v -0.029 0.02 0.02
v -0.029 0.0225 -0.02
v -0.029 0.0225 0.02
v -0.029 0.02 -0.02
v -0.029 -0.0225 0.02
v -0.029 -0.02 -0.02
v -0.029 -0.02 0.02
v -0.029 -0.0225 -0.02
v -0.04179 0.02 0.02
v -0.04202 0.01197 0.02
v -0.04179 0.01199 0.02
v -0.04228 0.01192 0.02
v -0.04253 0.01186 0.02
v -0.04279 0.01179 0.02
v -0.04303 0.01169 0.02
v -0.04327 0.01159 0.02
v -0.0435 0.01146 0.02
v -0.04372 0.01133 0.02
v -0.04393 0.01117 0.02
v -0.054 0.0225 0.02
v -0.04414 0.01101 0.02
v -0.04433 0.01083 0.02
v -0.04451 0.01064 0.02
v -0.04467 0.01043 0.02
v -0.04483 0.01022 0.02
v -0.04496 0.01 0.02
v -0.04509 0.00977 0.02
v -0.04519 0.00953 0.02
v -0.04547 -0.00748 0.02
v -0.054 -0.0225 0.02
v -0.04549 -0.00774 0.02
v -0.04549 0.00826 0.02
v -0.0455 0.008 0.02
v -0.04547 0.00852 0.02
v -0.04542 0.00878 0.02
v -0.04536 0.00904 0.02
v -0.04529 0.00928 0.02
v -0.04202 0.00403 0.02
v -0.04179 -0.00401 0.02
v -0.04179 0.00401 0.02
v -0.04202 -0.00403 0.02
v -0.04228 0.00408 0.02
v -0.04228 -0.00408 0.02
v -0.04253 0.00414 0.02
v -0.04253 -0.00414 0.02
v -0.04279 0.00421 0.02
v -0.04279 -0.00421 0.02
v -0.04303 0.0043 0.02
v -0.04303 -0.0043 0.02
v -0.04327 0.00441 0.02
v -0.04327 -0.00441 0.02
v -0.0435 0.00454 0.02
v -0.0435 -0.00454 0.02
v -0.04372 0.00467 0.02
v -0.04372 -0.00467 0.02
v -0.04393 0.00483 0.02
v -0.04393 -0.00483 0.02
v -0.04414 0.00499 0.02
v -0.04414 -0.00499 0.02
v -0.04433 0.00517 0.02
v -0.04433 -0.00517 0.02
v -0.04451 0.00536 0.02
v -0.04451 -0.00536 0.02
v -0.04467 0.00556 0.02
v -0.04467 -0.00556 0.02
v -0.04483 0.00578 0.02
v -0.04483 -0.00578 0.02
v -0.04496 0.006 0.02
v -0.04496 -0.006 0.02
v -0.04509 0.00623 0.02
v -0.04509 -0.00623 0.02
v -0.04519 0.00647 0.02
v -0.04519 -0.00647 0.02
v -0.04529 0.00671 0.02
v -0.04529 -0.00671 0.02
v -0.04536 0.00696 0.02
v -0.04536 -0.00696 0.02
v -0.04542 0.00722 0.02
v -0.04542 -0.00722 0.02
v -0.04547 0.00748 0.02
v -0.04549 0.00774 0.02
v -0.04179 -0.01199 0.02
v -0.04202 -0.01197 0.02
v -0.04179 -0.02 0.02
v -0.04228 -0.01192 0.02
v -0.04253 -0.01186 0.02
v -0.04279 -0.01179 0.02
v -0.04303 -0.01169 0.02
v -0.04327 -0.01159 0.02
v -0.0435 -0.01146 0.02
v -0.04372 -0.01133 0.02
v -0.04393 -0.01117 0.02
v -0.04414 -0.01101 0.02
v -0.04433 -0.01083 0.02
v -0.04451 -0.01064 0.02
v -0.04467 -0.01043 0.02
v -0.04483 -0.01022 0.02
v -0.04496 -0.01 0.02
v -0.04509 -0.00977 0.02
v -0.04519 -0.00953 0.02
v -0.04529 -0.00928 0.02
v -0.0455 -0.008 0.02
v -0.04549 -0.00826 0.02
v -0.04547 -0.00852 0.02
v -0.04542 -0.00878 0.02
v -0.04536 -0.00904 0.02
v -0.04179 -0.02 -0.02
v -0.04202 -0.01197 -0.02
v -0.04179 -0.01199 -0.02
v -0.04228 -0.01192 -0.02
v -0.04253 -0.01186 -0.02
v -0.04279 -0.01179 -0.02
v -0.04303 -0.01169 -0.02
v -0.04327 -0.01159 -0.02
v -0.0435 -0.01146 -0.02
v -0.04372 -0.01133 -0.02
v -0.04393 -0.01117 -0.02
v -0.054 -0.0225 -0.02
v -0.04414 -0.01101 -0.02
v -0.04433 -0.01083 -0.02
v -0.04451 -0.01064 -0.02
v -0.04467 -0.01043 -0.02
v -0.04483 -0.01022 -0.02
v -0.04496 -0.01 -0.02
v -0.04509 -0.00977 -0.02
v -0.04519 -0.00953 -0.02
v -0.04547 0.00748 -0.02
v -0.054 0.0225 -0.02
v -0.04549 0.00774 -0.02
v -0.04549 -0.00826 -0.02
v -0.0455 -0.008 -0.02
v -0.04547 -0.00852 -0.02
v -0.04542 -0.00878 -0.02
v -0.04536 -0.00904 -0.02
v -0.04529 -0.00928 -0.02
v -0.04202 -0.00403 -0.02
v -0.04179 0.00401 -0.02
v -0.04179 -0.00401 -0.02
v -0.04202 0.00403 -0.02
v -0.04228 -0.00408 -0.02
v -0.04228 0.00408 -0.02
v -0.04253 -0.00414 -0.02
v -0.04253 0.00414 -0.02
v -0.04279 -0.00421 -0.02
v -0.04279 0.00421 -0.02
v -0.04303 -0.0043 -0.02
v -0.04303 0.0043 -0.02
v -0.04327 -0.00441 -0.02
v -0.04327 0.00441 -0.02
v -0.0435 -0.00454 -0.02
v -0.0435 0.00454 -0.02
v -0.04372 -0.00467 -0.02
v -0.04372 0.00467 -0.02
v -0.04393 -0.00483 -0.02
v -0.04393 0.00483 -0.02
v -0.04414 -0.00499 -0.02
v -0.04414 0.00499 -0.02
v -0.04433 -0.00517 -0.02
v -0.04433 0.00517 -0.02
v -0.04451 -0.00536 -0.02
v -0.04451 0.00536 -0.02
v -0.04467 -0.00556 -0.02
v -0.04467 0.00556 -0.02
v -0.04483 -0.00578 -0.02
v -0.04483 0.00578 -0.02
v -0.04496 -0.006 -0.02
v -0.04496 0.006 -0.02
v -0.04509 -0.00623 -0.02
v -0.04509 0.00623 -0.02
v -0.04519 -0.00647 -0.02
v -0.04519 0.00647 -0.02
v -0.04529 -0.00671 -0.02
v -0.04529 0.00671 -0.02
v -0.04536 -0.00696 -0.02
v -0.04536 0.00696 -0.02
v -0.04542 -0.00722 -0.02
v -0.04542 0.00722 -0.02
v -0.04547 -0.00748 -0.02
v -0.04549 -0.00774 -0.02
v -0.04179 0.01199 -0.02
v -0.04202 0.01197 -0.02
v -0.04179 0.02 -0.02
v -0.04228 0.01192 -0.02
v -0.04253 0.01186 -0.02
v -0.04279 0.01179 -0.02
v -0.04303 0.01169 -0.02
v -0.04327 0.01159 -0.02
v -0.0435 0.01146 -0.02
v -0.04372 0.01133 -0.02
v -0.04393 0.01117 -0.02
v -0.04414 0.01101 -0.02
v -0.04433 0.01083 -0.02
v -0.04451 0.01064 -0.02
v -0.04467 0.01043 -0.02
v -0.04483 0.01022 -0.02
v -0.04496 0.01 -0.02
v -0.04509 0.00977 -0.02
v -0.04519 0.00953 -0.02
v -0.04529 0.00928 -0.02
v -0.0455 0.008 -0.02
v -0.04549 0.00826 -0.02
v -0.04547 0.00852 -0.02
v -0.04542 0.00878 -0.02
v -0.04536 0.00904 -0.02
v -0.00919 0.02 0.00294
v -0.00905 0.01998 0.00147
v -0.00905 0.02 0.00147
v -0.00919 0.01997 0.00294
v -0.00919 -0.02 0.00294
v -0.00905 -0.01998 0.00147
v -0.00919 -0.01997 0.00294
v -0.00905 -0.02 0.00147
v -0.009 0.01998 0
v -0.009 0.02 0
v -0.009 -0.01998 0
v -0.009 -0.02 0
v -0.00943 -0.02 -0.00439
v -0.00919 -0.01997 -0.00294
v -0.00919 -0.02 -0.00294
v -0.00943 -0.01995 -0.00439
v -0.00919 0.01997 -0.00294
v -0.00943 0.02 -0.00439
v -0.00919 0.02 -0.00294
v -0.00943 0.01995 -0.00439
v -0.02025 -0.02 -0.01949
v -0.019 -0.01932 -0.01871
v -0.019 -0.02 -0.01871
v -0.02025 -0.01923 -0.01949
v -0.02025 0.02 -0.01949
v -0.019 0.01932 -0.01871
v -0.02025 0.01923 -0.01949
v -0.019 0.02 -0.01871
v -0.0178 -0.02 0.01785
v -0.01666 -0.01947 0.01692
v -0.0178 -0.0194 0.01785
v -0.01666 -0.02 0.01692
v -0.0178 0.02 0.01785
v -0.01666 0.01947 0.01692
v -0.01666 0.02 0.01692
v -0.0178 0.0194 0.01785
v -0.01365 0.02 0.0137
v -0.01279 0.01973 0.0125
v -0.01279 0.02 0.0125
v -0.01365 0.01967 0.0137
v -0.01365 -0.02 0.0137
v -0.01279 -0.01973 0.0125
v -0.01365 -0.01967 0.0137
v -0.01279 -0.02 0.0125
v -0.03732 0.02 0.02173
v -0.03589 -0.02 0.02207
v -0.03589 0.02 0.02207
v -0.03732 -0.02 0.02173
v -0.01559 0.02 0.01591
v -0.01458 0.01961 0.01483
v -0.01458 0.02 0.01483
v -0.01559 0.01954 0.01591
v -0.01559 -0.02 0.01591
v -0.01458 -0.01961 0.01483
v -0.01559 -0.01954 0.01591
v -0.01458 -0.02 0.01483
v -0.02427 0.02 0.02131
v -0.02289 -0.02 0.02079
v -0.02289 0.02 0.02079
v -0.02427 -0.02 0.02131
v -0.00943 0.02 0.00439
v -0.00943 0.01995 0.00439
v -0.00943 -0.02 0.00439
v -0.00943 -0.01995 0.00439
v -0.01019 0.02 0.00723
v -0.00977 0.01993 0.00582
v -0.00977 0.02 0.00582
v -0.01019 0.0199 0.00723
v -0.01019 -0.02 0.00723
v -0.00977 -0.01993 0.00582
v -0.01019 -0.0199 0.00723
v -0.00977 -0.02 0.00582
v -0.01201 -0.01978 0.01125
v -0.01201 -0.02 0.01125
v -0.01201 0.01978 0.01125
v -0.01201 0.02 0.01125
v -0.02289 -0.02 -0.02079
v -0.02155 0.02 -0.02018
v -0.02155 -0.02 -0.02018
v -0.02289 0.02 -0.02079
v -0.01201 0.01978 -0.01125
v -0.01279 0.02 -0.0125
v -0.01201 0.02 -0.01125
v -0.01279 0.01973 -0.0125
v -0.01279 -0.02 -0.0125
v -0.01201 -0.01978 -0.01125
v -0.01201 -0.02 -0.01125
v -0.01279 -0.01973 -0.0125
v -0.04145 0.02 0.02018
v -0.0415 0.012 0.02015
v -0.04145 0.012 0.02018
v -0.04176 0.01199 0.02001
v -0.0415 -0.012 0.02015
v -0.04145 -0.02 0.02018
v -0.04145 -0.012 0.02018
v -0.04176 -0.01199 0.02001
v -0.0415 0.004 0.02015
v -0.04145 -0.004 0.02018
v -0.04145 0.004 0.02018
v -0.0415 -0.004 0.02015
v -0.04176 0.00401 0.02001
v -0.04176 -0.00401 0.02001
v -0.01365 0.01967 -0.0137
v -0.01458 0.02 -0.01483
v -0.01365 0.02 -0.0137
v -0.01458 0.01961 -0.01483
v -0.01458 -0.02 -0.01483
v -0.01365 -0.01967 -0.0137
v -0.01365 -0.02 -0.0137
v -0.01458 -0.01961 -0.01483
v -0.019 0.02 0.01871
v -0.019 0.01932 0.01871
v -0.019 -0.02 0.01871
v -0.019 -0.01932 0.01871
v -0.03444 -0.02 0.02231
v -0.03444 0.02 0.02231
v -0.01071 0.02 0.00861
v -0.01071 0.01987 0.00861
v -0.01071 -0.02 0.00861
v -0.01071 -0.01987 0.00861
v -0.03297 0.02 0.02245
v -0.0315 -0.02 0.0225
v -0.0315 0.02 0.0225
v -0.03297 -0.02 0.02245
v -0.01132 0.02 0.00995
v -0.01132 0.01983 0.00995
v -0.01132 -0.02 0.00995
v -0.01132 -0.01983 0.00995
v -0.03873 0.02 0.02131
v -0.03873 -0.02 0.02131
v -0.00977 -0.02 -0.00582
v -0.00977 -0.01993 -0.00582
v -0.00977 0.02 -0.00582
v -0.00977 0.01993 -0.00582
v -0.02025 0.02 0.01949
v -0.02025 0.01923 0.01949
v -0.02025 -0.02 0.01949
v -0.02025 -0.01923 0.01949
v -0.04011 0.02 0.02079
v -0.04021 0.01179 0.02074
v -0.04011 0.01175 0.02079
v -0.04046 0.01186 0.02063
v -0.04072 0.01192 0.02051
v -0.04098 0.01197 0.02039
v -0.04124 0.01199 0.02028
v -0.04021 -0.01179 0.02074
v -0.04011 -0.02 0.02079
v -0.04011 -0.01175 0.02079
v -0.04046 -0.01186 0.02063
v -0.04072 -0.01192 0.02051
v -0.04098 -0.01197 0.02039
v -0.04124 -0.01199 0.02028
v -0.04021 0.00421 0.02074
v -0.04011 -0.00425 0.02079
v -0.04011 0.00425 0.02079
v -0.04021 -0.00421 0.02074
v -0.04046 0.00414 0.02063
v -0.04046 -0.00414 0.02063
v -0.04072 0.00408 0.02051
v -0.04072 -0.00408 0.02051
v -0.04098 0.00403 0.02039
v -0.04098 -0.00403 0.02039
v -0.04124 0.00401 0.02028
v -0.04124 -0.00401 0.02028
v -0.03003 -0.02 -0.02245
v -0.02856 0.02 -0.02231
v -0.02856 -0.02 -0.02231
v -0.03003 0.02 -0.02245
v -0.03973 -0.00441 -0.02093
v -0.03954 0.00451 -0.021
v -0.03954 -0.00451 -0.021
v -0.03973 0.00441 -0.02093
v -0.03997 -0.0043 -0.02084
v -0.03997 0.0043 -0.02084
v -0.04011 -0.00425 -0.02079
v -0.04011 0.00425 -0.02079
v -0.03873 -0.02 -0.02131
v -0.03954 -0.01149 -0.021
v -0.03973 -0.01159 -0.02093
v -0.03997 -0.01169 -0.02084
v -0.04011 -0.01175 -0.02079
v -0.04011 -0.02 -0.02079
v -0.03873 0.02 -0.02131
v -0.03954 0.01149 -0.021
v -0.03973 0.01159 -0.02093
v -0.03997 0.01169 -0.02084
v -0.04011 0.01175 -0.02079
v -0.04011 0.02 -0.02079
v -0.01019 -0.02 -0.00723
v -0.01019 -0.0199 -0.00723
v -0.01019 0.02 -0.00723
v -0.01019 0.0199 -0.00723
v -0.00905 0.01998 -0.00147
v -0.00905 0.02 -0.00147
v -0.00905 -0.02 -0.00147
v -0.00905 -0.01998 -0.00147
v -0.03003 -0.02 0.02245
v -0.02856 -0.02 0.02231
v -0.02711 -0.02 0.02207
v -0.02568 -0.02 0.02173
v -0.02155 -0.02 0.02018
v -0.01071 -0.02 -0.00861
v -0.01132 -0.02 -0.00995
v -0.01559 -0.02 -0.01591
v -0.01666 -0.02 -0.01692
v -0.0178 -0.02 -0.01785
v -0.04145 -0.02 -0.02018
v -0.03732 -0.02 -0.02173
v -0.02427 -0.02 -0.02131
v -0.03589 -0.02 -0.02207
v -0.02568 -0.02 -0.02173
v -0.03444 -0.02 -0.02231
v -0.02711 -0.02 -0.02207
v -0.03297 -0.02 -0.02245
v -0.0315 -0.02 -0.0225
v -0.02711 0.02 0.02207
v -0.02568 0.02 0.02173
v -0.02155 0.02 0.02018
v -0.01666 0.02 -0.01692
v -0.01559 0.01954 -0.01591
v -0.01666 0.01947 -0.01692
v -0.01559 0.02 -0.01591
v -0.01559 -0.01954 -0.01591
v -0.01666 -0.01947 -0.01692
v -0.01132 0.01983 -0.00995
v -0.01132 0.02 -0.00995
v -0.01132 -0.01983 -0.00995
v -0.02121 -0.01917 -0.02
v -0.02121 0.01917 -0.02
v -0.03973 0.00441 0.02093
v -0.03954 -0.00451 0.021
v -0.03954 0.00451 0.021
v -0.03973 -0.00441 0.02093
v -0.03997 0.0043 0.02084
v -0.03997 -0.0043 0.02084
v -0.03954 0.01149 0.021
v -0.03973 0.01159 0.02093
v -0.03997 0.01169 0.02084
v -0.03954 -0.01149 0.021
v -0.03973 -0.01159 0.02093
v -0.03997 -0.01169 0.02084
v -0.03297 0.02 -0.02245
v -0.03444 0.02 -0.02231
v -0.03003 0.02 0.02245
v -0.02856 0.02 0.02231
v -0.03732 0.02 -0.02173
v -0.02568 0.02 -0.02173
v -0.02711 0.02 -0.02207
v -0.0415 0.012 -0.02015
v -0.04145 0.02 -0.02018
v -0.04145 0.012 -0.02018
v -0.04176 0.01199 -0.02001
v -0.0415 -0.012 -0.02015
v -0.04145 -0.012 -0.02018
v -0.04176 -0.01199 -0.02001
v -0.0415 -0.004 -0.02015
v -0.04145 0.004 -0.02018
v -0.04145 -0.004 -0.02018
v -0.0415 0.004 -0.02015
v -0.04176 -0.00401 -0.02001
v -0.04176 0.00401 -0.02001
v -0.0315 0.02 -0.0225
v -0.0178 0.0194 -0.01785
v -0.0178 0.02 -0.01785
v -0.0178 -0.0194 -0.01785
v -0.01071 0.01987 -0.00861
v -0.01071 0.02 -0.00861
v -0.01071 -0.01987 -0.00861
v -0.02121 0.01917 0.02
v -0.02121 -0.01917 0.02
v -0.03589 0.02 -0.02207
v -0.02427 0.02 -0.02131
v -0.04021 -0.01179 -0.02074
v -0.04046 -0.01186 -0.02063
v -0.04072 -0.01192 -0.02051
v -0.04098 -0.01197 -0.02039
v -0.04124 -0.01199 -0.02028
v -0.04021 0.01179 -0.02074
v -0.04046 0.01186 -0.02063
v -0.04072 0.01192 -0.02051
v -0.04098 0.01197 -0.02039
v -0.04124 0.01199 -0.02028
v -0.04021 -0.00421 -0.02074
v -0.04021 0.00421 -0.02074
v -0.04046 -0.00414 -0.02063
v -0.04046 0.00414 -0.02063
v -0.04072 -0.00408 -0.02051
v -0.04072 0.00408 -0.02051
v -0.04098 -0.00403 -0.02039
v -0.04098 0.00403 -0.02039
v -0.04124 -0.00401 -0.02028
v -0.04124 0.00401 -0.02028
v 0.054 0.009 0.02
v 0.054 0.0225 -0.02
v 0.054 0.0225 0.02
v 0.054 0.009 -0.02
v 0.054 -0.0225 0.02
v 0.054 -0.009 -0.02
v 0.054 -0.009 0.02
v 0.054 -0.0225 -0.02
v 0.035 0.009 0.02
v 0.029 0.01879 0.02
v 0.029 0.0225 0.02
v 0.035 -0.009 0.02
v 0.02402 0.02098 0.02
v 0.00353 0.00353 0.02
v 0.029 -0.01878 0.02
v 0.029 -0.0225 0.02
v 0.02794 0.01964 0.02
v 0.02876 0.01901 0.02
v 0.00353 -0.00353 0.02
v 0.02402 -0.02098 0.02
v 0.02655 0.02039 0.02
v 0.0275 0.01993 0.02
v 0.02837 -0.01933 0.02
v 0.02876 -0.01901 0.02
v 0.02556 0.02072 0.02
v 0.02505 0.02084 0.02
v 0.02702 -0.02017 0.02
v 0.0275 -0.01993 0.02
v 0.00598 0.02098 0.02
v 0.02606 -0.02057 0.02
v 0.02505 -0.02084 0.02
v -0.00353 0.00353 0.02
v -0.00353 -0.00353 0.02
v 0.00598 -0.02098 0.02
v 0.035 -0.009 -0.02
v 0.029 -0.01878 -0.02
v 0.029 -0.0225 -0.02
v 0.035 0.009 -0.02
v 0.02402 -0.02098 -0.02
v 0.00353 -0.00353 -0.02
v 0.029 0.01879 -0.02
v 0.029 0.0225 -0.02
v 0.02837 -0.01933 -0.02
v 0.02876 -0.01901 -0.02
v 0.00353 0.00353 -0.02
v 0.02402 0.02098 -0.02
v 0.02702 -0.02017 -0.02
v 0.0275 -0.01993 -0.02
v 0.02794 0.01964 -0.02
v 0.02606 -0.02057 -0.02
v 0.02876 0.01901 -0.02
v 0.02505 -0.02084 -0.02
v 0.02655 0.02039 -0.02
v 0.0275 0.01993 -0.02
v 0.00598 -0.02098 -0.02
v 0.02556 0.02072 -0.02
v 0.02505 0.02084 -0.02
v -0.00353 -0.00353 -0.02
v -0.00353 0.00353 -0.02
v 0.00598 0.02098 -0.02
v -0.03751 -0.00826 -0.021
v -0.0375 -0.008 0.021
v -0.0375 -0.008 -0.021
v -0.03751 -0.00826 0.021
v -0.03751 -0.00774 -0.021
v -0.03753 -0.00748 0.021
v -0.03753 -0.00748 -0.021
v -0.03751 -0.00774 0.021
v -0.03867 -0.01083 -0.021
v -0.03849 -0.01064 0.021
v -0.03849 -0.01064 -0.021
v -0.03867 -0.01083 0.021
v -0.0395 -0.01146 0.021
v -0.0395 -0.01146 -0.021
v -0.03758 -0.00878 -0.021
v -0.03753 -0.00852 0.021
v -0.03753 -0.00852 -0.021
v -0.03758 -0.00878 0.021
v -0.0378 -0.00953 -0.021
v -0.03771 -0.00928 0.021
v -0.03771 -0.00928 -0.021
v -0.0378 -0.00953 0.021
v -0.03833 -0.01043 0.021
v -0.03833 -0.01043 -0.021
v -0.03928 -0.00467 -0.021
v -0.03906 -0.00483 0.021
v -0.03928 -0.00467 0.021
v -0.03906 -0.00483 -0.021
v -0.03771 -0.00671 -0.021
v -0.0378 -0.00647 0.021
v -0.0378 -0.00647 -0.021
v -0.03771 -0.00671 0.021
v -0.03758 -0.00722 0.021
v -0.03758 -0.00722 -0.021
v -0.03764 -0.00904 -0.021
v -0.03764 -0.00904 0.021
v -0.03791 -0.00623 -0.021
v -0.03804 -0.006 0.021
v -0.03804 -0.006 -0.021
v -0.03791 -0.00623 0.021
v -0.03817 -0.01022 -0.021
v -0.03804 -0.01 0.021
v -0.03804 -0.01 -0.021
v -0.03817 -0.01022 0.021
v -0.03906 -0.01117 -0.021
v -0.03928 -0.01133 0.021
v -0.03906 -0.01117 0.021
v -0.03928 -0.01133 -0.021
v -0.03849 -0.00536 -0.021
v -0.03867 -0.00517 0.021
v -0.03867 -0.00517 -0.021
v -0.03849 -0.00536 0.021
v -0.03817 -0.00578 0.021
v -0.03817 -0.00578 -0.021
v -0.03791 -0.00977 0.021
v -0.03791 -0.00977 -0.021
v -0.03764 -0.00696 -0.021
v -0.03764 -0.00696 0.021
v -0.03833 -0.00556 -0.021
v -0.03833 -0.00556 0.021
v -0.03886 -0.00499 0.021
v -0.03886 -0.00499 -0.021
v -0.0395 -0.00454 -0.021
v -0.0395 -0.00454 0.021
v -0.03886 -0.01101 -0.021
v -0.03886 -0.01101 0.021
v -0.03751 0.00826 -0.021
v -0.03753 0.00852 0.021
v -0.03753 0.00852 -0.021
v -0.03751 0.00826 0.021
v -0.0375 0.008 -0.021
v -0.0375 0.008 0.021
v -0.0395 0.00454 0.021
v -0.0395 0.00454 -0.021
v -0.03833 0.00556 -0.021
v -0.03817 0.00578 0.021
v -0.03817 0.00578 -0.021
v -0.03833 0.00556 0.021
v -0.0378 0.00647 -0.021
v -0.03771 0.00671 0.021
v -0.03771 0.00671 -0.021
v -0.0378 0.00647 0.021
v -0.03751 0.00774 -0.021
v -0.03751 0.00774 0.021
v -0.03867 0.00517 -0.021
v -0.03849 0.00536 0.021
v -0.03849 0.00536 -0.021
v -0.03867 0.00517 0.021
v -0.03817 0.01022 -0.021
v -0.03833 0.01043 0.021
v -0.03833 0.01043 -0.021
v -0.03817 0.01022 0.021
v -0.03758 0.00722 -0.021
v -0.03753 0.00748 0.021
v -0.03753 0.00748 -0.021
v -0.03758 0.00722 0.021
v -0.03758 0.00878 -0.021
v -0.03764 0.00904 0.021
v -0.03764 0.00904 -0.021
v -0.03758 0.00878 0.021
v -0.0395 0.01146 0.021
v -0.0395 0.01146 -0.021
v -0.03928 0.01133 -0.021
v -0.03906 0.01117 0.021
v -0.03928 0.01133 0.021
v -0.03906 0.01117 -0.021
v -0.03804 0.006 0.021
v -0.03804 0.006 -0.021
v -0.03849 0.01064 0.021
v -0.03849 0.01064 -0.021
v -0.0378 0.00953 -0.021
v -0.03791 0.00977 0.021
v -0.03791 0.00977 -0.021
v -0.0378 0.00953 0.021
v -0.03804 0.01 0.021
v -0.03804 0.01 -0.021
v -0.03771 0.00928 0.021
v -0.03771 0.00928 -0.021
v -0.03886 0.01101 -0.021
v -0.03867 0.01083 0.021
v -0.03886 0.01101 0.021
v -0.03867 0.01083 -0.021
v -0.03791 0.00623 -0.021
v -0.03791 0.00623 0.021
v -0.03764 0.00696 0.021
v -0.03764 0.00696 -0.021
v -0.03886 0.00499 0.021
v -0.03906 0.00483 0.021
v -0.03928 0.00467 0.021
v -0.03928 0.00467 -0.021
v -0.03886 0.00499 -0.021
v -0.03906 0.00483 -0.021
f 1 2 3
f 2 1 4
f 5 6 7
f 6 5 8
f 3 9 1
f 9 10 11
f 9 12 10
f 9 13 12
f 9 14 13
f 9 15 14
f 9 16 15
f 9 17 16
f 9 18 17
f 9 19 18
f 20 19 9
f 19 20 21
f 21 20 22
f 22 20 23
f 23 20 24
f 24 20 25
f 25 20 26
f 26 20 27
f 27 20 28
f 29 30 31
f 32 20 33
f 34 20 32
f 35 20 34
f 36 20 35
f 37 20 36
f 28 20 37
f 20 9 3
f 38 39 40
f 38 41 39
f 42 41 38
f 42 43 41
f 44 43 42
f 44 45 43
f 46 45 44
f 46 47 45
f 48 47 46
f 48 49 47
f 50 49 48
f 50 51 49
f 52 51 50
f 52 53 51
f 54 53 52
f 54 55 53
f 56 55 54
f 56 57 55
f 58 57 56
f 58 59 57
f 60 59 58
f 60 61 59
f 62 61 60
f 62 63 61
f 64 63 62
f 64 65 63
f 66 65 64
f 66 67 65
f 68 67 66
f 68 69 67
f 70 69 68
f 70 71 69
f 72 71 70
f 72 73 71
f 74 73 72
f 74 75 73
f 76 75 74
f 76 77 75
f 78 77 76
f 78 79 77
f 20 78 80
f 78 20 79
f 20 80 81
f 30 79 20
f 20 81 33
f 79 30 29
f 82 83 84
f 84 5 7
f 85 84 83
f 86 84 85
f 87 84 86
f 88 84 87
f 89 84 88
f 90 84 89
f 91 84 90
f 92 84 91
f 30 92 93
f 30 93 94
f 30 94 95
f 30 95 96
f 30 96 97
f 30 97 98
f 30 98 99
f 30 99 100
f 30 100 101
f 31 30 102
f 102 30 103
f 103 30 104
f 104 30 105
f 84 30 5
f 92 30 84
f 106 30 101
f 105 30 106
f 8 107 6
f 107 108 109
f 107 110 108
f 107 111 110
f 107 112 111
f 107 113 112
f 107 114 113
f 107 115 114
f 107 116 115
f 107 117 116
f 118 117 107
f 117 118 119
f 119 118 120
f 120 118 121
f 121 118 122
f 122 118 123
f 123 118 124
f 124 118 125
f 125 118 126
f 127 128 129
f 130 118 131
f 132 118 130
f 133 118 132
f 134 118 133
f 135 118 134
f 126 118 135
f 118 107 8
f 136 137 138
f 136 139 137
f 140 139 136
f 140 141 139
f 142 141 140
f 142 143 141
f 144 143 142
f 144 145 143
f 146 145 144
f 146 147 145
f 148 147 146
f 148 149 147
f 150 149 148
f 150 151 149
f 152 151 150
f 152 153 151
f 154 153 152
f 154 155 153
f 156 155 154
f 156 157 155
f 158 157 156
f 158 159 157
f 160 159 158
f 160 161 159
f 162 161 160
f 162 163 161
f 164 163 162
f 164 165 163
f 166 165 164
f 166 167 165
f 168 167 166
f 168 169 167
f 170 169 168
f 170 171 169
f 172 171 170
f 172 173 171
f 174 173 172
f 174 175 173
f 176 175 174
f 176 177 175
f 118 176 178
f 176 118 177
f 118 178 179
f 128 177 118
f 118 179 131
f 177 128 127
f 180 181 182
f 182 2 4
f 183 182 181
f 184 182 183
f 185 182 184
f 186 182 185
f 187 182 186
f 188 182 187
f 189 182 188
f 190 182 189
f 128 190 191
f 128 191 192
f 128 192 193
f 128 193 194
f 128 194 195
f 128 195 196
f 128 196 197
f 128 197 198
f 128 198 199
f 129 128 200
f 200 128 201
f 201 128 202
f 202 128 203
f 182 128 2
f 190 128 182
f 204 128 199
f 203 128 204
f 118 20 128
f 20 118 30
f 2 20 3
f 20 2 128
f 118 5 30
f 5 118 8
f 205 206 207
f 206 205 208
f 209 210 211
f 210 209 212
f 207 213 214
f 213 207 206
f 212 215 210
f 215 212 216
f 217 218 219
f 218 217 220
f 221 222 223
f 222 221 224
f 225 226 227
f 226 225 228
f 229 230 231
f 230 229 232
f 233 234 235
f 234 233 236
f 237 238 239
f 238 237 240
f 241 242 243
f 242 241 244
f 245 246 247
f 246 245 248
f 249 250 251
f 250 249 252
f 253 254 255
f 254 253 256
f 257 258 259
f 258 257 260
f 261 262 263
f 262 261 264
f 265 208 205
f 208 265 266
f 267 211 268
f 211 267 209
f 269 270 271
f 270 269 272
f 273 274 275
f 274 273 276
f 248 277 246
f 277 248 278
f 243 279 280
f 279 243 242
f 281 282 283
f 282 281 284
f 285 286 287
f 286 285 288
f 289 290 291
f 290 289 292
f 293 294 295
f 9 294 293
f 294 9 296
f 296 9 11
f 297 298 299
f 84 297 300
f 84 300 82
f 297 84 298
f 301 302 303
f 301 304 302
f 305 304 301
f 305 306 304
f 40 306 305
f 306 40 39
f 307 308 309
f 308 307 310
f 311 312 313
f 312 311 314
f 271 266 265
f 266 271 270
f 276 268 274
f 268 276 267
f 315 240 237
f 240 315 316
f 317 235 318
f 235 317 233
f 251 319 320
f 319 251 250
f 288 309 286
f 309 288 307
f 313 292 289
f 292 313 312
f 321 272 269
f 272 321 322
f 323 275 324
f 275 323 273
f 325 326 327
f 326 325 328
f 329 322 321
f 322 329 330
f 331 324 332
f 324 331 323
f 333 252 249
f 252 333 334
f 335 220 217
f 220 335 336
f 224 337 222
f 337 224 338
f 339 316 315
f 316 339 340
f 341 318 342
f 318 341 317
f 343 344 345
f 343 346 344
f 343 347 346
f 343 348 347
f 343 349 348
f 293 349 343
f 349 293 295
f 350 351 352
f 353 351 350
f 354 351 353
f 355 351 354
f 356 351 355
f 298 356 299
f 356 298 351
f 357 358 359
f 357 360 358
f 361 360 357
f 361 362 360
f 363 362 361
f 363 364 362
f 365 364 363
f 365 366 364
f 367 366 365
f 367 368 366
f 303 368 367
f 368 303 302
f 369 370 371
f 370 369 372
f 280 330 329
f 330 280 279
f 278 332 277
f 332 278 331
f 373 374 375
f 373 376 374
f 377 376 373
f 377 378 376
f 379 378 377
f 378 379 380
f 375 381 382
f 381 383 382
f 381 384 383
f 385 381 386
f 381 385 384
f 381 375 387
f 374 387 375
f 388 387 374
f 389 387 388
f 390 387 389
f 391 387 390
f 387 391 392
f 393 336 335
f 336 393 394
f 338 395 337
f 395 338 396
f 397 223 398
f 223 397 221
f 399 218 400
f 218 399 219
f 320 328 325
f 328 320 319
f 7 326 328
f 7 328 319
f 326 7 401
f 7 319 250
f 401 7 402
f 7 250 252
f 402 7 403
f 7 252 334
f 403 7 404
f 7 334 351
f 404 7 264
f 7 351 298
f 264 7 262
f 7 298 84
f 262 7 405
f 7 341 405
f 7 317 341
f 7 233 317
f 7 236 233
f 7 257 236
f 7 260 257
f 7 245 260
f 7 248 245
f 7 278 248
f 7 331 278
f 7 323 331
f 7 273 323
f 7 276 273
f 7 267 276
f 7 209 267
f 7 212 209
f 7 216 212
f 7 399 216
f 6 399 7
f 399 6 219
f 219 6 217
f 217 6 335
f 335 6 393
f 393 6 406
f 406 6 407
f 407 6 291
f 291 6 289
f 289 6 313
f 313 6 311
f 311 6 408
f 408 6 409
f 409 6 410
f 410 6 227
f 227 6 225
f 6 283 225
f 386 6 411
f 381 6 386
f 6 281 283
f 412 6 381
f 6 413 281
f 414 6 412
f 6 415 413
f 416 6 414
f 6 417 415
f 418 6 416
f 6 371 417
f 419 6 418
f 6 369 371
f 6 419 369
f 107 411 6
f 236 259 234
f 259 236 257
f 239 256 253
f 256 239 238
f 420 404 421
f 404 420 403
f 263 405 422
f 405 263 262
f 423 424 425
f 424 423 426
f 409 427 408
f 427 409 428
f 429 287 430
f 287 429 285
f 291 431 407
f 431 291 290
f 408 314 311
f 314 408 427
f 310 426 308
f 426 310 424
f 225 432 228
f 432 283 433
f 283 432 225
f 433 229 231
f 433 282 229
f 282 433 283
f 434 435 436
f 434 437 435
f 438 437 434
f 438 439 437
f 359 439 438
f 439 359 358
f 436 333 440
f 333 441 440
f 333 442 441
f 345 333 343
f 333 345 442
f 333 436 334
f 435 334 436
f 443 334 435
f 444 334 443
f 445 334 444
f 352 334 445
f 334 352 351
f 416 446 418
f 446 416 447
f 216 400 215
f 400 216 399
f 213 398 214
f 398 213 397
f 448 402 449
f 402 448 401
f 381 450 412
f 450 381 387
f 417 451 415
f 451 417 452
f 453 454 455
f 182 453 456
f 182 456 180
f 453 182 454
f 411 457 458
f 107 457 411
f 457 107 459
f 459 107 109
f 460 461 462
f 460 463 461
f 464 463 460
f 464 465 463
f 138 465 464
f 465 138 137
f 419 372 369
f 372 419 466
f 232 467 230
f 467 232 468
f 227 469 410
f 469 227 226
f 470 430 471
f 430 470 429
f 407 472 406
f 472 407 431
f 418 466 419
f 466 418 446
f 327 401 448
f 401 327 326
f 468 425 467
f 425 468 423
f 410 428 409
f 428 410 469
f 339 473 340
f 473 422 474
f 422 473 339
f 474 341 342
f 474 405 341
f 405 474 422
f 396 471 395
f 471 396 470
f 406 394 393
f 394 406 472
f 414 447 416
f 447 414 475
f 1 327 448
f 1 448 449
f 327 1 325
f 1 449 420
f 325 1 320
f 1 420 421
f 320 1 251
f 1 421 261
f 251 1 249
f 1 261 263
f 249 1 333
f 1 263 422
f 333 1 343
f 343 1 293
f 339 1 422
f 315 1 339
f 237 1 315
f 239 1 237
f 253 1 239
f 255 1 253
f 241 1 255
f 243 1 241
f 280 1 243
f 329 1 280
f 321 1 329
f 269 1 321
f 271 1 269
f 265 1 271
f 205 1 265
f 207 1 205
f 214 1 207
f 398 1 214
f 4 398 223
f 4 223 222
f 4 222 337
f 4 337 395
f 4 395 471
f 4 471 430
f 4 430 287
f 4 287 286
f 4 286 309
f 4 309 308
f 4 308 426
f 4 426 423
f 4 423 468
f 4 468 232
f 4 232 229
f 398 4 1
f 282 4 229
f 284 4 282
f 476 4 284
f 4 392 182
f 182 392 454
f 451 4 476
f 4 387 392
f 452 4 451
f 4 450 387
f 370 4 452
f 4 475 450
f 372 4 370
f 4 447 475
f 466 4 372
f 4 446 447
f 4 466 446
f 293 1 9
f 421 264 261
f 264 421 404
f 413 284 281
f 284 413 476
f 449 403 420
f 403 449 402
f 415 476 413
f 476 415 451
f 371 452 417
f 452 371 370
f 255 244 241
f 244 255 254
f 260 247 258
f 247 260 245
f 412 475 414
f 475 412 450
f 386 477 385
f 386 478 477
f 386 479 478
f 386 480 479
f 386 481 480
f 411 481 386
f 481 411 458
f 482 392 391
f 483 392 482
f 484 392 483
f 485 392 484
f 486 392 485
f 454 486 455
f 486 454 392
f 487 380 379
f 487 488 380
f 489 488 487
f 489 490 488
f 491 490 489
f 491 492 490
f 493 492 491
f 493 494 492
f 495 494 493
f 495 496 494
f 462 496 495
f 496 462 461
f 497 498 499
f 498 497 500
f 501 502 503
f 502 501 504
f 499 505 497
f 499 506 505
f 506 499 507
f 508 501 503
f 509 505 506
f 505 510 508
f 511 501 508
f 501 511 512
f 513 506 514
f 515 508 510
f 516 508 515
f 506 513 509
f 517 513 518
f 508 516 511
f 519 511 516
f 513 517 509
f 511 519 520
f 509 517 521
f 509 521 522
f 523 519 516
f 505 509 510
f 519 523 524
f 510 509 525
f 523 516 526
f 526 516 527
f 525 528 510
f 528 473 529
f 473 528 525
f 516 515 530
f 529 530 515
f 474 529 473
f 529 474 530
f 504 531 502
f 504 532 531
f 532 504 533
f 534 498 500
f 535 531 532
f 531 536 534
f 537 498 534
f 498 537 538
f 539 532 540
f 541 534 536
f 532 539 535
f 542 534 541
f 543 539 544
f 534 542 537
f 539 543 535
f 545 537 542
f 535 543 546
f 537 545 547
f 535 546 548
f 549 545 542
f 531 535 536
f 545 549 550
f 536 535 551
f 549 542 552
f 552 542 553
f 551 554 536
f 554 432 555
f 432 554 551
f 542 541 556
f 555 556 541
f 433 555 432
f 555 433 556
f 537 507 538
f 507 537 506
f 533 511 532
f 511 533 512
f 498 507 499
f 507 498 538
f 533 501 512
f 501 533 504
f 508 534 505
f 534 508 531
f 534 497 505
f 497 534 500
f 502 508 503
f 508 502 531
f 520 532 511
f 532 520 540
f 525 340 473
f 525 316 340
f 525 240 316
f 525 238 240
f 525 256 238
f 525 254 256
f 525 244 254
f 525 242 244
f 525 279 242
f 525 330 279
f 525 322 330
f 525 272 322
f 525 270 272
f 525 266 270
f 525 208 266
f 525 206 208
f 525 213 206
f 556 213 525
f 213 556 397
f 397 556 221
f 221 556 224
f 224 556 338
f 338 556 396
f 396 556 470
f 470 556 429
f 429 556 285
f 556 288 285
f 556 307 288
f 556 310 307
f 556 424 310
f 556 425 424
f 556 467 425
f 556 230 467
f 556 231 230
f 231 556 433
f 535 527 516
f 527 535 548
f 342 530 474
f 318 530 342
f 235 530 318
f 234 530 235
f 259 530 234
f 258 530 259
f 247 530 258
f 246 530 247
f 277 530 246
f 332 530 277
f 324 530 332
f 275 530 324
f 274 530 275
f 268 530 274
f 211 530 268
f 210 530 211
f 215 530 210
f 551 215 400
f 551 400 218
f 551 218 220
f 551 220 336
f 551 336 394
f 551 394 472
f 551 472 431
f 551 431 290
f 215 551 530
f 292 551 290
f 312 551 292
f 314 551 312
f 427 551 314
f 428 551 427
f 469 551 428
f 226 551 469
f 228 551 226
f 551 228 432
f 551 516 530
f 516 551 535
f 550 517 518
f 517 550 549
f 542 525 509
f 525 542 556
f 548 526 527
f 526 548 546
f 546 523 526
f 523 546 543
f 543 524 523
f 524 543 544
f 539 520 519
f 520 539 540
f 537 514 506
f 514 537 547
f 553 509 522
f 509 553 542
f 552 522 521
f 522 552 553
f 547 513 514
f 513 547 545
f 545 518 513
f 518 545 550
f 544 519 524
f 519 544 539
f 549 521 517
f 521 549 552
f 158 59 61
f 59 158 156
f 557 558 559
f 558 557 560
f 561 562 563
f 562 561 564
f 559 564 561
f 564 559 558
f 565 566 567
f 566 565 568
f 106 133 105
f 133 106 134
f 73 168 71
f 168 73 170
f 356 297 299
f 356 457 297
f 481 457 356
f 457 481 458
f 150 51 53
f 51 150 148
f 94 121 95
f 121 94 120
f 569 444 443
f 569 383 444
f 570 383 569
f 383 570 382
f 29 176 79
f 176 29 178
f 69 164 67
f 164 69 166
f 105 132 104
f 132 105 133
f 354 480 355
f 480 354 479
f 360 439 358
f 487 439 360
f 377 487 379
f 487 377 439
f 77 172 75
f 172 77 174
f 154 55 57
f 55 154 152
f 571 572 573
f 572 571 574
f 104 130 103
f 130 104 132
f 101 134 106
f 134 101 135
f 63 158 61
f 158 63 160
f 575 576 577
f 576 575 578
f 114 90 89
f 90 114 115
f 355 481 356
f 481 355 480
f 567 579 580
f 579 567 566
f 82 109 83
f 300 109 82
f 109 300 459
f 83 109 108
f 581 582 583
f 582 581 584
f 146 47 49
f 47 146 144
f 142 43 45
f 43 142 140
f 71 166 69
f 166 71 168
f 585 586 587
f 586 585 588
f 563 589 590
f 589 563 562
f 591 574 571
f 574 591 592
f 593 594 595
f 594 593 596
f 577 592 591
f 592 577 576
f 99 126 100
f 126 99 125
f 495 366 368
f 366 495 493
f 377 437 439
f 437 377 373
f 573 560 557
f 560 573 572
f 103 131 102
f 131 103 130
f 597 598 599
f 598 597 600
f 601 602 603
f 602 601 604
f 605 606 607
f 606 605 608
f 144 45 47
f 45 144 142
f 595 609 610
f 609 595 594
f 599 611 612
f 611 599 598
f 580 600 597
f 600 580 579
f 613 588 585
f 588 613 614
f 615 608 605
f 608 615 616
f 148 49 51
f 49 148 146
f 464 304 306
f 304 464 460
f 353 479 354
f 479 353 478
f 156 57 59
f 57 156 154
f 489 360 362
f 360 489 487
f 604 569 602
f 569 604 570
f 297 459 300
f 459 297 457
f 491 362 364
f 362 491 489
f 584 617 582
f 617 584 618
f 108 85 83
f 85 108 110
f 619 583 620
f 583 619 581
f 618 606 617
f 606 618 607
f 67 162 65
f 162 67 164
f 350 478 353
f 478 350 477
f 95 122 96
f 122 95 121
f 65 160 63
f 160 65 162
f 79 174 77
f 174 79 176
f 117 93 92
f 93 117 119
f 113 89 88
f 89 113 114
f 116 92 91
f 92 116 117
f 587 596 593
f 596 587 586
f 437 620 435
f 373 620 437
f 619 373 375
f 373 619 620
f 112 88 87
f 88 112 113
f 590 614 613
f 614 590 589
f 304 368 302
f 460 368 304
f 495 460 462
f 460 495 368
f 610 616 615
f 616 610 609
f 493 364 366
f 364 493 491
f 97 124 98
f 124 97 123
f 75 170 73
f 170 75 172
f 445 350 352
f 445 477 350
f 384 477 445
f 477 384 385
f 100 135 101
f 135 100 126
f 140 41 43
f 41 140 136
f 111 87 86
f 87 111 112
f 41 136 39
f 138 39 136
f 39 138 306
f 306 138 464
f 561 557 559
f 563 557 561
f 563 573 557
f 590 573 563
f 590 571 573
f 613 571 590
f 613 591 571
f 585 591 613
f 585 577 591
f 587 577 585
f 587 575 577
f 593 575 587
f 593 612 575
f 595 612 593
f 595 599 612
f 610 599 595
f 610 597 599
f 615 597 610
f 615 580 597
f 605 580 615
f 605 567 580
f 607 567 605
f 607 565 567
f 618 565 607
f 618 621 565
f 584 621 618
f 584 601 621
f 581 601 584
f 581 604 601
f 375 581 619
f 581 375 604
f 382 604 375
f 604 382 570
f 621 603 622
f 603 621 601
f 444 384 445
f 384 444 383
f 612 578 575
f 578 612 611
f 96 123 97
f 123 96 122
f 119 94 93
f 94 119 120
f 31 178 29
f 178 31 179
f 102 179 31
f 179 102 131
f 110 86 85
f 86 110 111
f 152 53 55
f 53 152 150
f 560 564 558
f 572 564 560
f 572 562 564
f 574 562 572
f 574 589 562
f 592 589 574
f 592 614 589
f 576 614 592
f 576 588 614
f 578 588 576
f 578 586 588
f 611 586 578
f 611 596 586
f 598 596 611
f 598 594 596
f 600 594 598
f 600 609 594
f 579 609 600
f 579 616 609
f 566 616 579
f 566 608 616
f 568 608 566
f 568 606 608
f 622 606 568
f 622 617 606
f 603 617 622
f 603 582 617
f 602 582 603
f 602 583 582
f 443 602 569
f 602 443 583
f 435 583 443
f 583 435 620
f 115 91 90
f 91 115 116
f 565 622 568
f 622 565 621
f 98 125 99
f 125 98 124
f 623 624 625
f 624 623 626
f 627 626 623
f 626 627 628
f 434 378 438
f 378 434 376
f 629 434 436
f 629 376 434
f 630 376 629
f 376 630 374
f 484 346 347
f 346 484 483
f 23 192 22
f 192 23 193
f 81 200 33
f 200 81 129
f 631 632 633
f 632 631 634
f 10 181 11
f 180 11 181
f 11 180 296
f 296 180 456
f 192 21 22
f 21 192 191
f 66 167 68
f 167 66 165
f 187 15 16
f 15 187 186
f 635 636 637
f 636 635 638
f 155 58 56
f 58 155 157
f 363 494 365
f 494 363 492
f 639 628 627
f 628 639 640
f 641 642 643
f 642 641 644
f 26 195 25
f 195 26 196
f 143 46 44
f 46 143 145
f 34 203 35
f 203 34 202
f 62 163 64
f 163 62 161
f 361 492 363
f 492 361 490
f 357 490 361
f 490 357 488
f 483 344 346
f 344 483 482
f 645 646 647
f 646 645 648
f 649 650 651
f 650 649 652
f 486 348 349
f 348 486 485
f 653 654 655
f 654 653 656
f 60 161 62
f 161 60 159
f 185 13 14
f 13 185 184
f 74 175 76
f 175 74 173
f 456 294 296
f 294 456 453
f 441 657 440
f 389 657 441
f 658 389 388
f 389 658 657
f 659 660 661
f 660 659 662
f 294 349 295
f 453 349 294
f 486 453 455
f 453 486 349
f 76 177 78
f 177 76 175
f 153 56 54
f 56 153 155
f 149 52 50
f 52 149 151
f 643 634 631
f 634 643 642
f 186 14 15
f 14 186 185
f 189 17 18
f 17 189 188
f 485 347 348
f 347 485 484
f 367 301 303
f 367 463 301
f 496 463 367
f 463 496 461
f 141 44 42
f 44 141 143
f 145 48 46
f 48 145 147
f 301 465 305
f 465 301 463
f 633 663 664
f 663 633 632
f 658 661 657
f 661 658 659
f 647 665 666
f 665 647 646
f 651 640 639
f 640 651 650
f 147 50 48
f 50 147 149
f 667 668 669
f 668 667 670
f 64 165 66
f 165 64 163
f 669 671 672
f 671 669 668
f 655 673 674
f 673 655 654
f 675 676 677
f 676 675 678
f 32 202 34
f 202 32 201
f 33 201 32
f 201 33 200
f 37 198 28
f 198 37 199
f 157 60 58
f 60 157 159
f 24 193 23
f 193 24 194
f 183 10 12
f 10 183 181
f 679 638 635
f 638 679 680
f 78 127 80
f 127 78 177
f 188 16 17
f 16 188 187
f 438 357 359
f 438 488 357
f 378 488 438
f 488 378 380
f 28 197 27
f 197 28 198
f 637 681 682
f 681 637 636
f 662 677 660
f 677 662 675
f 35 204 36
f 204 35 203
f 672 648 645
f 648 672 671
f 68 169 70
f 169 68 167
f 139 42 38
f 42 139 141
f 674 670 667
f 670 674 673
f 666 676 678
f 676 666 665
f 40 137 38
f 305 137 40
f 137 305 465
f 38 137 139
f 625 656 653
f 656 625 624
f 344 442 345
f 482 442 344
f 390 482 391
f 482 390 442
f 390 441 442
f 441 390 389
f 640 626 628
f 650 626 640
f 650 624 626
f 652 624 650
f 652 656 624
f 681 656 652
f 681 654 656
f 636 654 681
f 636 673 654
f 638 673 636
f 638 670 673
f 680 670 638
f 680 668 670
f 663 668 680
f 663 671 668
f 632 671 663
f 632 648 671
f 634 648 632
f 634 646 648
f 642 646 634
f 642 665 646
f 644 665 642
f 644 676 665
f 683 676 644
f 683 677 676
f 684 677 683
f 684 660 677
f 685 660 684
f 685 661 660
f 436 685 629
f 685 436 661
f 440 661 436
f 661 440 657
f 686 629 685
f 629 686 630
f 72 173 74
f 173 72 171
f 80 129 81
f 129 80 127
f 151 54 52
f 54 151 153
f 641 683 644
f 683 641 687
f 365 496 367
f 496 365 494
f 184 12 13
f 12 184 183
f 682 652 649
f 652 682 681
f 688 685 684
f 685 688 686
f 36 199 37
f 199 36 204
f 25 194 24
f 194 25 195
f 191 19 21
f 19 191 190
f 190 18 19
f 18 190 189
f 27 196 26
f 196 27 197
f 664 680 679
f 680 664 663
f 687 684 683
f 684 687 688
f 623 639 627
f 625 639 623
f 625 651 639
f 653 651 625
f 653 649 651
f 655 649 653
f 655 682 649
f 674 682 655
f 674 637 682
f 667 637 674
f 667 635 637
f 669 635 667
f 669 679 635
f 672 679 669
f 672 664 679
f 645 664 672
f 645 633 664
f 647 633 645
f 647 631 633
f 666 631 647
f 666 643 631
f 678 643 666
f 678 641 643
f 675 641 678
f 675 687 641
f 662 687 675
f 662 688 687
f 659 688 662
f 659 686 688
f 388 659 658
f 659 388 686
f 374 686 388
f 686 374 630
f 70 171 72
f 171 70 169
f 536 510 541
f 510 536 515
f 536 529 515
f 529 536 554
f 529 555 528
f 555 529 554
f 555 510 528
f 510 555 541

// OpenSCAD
$fn = 96;

// -------------------- Parameters (mm) --------------------
L = 0.11;                 // overall target length (approx)
W = 0.05;                 // overall target width (approx)
H = 0.04;                 // thickness

body_L = 0.06;
body_W = 0.038;
body_corner_r = 0.008;

tab_L = 0.025;
tab_W = 0.045;
tab_hole_d = 0.008;
tab_hole_spacing = 0.016;

clevis_L = 0.025;
clevis_outer_W = 0.045;
clevis_slot_W = 0.018;
clevis_slot_depth = 0.018;

diamond_flat_to_flat = 0.01;
diamond_rotation_deg = 45;

overlap = 0.001;

// -------------------- Helpers --------------------
module rounded_rect_2d(l, w, r) {
  r2 = min(r, min(l, w)/2);
  hull() {
    for (sx = [-1, 1], sy = [-1, 1])
      translate([sx*(l/2 - r2), sy*(w/2 - r2)]) circle(r=r2);
  }
}

module rounded_rect_3d(l, w, h, r) {
  linear_extrude(height=h, center=true)
    rounded_rect_2d(l, w, r);
}

// -------------------- Main body (barrel-like rounded rectangle) --------------------
module main_body_barrel() {
  // Slightly more "barrel" by bulging width at mid using hull of two rounded rectangles
  // (keeps it clearly rounded in top/bottom views)
  bulge = min(0.004, body_W*0.15);
  hull() {
    translate([-body_L*0.25, 0, 0])
      rounded_rect_3d(body_L*0.55, body_W, H, body_corner_r);
    translate([ body_L*0.25, 0, 0])
      rounded_rect_3d(body_L*0.55, body_W + bulge, H, body_corner_r);
  }
}

// -------------------- Mounting tab with rounded end --------------------
module mounting_tab_solid() {
  // Tab attaches to -X end of body with overlap
  x0 = -(body_L/2 + tab_L/2 - overlap);

  union() {
    // Rect portion
    translate([x0, 0, 0])
      cube([tab_L, tab_W, H], center=true);

    // Rounded end cap (semicircle) on the far -X end
    // Place a cylinder whose center is at the far end of the tab
    xcap = x0 - tab_L/2 + tab_W/2;
    translate([xcap, 0, 0])
      rotate([90, 0, 0])
        cylinder(r=tab_W/2, h=H, center=true);
  }
}

module mounting_tab_holes() {
  // Holes centered in tab, spaced along Y
  x0 = -(body_L/2 + tab_L/2 - overlap);
  for (sy = [-1, 1])
    translate([x0, sy*tab_hole_spacing/2, 0])
      cylinder(r=tab_hole_d/2, h=H + 2*overlap, center=true);
}

// -------------------- Clevis fork end (U-notch) --------------------
module clevis_fork_solid() {
  // Outer block attached to +X end of body with overlap
  x0 = (body_L/2 + clevis_L/2 - overlap);

  difference() {
    translate([x0, 0, 0])
      cube([clevis_L, clevis_outer_W, H], center=true);

    // U-shaped opening from the +X end inward:
    // subtract a rectangular slot that starts at the far +X face and goes inward by slot_depth
    // Use a slightly longer cutter in X and Z to guarantee clean subtraction.
    xslot = (body_L/2 + clevis_L - clevis_slot_depth/2 - overlap);
    translate([xslot, 0, 0])
      cube([clevis_slot_depth + 2*overlap, clevis_slot_W, H + 2*overlap], center=true);
  }
}

// -------------------- Center diamond through hole --------------------
module center_diamond_through_hole() {
  rotate([0, 0, diamond_rotation_deg])
    linear_extrude(height=H + 2*overlap, center=true)
      polygon(points=[
        [ diamond_flat_to_flat/2, 0],
        [0,  diamond_flat_to_flat/2],
        [-diamond_flat_to_flat/2, 0],
        [0, -diamond_flat_to_flat/2]
      ]);
}

// -------------------- Final assembly --------------------
module final_assembly() {
  difference() {
    union() {
      main_body_barrel();
      mounting_tab_solid();
      clevis_fork_solid();
    }
    mounting_tab_holes();
    center_diamond_through_hole();
  }
}

color("Silver") final_assembly();
